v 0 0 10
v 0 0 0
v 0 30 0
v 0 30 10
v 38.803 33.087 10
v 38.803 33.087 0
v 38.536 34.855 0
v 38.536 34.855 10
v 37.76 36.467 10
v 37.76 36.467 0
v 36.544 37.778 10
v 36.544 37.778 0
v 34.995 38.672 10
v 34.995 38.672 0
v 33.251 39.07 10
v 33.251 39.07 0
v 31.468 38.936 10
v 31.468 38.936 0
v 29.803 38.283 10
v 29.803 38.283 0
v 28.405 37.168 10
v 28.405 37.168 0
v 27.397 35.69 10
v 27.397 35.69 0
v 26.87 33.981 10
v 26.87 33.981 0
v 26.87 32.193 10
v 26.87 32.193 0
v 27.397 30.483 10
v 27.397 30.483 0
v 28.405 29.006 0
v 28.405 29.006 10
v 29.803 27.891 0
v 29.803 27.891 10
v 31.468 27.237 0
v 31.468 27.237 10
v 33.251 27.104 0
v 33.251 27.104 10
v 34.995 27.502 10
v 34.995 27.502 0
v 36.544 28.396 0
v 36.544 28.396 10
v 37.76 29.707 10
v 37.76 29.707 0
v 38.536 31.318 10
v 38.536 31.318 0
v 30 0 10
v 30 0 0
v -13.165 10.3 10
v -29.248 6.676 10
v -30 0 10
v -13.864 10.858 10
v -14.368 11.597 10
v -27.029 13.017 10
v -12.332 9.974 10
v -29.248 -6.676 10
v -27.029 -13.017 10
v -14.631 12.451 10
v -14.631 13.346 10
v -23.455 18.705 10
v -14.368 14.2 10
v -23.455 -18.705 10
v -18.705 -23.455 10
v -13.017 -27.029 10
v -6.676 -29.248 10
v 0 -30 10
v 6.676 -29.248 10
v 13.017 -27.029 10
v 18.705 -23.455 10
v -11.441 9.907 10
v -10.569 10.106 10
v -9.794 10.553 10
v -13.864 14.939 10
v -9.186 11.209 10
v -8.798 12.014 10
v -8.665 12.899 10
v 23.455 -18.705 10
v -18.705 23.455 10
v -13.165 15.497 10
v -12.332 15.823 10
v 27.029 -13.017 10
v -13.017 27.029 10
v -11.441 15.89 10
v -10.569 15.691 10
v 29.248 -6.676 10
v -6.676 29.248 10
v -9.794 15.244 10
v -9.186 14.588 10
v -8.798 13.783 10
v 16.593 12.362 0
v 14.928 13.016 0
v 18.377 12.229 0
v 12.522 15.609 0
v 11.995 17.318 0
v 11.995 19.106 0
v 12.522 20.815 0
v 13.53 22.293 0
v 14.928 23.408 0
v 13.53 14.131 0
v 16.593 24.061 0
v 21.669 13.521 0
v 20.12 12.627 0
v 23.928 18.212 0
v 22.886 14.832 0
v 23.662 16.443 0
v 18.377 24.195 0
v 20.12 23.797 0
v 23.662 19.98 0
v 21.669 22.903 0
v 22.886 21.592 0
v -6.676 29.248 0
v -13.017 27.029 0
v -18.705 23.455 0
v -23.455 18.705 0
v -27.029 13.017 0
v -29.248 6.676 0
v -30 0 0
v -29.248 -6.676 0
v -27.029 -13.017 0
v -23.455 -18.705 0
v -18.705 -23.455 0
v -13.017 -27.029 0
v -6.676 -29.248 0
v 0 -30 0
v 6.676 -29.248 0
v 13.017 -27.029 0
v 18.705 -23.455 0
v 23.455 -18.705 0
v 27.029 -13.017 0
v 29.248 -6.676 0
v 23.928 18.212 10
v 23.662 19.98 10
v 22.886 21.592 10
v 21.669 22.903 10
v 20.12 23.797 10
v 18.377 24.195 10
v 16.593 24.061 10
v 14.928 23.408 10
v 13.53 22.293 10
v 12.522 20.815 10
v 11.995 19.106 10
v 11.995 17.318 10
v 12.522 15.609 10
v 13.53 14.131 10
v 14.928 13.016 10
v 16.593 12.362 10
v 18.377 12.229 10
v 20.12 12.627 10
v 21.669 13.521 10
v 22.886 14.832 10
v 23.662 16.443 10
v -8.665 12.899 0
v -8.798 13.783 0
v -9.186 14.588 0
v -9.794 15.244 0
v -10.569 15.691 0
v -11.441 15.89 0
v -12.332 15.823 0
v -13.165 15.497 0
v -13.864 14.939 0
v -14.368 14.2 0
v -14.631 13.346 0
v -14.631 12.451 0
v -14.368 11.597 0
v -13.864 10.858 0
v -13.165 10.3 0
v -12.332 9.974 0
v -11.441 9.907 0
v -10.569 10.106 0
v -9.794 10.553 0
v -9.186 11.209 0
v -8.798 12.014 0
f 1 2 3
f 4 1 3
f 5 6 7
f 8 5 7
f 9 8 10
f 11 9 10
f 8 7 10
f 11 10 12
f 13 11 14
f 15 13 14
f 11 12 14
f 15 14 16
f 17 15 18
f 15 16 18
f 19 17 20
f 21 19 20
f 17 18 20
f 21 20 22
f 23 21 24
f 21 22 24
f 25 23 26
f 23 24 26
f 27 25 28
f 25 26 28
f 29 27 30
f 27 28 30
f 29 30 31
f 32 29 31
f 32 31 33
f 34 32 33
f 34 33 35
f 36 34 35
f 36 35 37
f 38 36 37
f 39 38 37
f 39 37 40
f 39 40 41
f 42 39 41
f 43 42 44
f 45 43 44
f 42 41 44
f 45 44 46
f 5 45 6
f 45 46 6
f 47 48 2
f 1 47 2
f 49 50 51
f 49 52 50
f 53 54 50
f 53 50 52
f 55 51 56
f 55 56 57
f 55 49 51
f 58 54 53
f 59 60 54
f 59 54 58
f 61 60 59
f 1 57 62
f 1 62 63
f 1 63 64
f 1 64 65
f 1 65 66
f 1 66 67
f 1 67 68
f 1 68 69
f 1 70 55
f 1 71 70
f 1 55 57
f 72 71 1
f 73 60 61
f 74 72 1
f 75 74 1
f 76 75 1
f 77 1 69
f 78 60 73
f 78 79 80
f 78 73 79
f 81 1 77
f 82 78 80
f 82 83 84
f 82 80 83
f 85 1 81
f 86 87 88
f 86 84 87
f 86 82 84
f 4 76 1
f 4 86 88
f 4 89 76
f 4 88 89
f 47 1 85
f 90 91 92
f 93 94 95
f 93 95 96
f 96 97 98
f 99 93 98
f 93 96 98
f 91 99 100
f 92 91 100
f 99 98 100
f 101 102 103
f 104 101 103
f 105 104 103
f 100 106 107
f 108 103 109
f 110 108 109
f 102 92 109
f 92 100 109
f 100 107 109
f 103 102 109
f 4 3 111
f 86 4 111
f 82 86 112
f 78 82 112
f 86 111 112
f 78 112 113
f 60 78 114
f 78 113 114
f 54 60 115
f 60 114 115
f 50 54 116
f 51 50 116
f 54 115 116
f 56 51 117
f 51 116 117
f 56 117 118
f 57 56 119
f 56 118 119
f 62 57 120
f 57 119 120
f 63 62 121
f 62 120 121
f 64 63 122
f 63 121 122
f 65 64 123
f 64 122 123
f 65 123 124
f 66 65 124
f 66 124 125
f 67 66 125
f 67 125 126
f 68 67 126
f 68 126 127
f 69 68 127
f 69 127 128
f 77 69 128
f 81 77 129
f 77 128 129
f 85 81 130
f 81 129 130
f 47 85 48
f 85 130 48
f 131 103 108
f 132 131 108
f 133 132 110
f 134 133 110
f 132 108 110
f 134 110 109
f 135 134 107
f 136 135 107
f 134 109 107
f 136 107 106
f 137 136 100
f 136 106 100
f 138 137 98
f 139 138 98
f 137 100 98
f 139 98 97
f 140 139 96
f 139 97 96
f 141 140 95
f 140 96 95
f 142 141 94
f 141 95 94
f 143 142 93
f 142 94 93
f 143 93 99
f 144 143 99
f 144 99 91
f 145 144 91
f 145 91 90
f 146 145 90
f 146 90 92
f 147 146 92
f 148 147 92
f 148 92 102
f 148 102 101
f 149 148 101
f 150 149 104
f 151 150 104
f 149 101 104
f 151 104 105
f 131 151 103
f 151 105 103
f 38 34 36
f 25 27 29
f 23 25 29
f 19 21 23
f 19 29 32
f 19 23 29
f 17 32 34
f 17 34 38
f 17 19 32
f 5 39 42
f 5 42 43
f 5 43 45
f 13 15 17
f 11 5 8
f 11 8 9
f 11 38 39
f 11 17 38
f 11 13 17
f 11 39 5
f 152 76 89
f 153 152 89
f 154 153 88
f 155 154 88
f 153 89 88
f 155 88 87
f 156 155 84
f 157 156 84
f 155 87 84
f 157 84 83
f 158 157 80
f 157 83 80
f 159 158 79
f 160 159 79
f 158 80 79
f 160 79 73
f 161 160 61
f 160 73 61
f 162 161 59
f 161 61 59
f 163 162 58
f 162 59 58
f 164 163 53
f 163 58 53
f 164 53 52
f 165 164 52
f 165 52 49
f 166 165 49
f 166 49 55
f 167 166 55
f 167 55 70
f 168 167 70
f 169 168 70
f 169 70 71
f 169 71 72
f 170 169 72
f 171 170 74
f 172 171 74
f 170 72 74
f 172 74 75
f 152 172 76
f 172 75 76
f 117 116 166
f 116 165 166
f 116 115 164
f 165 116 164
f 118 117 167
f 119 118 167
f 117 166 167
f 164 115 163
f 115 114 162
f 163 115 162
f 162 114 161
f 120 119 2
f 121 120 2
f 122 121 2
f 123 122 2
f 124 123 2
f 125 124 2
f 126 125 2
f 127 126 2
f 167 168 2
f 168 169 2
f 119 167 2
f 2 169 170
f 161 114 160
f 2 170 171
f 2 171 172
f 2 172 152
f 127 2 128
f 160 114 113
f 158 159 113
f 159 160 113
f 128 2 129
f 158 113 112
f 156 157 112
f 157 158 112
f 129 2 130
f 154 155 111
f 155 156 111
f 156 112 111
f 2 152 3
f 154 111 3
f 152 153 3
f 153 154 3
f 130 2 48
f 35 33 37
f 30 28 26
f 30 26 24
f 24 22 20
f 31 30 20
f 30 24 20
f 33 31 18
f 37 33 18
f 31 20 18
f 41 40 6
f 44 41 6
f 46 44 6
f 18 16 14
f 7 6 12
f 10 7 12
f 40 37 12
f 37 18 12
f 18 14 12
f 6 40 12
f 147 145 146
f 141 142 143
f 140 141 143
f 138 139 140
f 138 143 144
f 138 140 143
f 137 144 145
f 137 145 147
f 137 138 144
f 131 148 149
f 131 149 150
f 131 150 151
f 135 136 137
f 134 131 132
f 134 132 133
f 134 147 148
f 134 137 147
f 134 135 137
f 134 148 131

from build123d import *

# Parameters (mm, degrees)
F1_DEPTH = 10
F2_R     = 3
F3_DEPTH = 10
F4_R     = 6
F5_DEPTH = 10
F6_R     = 6
F7_DEPTH = 10


with BuildPart() as f1:
    # F0 (on Top) → F1 (new body)
    with BuildSketch(Plane.XY):
        with BuildLine():
            Line((0, 0), (0, 30))
            ThreePointArc((0, 30), (-21.213203, -21.213203), (30, 0))
            Line((30, 0), (0, 0))
        make_face()
    extrude(amount=F1_DEPTH)

    # F2 (on face) → F3 (cut)
    with BuildSketch(Plane.XY.offset(10)):
        with Locations((-11.66472, 12.898528)):
            Circle(F2_R)
    extrude(amount=-F3_DEPTH, mode=Mode.SUBTRACT)


with BuildPart() as f5:
    # F4 (on Top) → F5 (new body)
    with BuildSketch(Plane.XY):
        with Locations((17.928179, 18.211897)):
            Circle(F4_R)
    extrude(amount=F5_DEPTH)


with BuildPart() as f7:
    # F6 (on Top) → F7 (new body)
    with BuildSketch(Plane.XY):
        with Locations((32.803044, 33.086766)):
            Circle(F6_R)
    extrude(amount=F7_DEPTH)


solid = Compound([f1.part, f5.part, f7.part])
